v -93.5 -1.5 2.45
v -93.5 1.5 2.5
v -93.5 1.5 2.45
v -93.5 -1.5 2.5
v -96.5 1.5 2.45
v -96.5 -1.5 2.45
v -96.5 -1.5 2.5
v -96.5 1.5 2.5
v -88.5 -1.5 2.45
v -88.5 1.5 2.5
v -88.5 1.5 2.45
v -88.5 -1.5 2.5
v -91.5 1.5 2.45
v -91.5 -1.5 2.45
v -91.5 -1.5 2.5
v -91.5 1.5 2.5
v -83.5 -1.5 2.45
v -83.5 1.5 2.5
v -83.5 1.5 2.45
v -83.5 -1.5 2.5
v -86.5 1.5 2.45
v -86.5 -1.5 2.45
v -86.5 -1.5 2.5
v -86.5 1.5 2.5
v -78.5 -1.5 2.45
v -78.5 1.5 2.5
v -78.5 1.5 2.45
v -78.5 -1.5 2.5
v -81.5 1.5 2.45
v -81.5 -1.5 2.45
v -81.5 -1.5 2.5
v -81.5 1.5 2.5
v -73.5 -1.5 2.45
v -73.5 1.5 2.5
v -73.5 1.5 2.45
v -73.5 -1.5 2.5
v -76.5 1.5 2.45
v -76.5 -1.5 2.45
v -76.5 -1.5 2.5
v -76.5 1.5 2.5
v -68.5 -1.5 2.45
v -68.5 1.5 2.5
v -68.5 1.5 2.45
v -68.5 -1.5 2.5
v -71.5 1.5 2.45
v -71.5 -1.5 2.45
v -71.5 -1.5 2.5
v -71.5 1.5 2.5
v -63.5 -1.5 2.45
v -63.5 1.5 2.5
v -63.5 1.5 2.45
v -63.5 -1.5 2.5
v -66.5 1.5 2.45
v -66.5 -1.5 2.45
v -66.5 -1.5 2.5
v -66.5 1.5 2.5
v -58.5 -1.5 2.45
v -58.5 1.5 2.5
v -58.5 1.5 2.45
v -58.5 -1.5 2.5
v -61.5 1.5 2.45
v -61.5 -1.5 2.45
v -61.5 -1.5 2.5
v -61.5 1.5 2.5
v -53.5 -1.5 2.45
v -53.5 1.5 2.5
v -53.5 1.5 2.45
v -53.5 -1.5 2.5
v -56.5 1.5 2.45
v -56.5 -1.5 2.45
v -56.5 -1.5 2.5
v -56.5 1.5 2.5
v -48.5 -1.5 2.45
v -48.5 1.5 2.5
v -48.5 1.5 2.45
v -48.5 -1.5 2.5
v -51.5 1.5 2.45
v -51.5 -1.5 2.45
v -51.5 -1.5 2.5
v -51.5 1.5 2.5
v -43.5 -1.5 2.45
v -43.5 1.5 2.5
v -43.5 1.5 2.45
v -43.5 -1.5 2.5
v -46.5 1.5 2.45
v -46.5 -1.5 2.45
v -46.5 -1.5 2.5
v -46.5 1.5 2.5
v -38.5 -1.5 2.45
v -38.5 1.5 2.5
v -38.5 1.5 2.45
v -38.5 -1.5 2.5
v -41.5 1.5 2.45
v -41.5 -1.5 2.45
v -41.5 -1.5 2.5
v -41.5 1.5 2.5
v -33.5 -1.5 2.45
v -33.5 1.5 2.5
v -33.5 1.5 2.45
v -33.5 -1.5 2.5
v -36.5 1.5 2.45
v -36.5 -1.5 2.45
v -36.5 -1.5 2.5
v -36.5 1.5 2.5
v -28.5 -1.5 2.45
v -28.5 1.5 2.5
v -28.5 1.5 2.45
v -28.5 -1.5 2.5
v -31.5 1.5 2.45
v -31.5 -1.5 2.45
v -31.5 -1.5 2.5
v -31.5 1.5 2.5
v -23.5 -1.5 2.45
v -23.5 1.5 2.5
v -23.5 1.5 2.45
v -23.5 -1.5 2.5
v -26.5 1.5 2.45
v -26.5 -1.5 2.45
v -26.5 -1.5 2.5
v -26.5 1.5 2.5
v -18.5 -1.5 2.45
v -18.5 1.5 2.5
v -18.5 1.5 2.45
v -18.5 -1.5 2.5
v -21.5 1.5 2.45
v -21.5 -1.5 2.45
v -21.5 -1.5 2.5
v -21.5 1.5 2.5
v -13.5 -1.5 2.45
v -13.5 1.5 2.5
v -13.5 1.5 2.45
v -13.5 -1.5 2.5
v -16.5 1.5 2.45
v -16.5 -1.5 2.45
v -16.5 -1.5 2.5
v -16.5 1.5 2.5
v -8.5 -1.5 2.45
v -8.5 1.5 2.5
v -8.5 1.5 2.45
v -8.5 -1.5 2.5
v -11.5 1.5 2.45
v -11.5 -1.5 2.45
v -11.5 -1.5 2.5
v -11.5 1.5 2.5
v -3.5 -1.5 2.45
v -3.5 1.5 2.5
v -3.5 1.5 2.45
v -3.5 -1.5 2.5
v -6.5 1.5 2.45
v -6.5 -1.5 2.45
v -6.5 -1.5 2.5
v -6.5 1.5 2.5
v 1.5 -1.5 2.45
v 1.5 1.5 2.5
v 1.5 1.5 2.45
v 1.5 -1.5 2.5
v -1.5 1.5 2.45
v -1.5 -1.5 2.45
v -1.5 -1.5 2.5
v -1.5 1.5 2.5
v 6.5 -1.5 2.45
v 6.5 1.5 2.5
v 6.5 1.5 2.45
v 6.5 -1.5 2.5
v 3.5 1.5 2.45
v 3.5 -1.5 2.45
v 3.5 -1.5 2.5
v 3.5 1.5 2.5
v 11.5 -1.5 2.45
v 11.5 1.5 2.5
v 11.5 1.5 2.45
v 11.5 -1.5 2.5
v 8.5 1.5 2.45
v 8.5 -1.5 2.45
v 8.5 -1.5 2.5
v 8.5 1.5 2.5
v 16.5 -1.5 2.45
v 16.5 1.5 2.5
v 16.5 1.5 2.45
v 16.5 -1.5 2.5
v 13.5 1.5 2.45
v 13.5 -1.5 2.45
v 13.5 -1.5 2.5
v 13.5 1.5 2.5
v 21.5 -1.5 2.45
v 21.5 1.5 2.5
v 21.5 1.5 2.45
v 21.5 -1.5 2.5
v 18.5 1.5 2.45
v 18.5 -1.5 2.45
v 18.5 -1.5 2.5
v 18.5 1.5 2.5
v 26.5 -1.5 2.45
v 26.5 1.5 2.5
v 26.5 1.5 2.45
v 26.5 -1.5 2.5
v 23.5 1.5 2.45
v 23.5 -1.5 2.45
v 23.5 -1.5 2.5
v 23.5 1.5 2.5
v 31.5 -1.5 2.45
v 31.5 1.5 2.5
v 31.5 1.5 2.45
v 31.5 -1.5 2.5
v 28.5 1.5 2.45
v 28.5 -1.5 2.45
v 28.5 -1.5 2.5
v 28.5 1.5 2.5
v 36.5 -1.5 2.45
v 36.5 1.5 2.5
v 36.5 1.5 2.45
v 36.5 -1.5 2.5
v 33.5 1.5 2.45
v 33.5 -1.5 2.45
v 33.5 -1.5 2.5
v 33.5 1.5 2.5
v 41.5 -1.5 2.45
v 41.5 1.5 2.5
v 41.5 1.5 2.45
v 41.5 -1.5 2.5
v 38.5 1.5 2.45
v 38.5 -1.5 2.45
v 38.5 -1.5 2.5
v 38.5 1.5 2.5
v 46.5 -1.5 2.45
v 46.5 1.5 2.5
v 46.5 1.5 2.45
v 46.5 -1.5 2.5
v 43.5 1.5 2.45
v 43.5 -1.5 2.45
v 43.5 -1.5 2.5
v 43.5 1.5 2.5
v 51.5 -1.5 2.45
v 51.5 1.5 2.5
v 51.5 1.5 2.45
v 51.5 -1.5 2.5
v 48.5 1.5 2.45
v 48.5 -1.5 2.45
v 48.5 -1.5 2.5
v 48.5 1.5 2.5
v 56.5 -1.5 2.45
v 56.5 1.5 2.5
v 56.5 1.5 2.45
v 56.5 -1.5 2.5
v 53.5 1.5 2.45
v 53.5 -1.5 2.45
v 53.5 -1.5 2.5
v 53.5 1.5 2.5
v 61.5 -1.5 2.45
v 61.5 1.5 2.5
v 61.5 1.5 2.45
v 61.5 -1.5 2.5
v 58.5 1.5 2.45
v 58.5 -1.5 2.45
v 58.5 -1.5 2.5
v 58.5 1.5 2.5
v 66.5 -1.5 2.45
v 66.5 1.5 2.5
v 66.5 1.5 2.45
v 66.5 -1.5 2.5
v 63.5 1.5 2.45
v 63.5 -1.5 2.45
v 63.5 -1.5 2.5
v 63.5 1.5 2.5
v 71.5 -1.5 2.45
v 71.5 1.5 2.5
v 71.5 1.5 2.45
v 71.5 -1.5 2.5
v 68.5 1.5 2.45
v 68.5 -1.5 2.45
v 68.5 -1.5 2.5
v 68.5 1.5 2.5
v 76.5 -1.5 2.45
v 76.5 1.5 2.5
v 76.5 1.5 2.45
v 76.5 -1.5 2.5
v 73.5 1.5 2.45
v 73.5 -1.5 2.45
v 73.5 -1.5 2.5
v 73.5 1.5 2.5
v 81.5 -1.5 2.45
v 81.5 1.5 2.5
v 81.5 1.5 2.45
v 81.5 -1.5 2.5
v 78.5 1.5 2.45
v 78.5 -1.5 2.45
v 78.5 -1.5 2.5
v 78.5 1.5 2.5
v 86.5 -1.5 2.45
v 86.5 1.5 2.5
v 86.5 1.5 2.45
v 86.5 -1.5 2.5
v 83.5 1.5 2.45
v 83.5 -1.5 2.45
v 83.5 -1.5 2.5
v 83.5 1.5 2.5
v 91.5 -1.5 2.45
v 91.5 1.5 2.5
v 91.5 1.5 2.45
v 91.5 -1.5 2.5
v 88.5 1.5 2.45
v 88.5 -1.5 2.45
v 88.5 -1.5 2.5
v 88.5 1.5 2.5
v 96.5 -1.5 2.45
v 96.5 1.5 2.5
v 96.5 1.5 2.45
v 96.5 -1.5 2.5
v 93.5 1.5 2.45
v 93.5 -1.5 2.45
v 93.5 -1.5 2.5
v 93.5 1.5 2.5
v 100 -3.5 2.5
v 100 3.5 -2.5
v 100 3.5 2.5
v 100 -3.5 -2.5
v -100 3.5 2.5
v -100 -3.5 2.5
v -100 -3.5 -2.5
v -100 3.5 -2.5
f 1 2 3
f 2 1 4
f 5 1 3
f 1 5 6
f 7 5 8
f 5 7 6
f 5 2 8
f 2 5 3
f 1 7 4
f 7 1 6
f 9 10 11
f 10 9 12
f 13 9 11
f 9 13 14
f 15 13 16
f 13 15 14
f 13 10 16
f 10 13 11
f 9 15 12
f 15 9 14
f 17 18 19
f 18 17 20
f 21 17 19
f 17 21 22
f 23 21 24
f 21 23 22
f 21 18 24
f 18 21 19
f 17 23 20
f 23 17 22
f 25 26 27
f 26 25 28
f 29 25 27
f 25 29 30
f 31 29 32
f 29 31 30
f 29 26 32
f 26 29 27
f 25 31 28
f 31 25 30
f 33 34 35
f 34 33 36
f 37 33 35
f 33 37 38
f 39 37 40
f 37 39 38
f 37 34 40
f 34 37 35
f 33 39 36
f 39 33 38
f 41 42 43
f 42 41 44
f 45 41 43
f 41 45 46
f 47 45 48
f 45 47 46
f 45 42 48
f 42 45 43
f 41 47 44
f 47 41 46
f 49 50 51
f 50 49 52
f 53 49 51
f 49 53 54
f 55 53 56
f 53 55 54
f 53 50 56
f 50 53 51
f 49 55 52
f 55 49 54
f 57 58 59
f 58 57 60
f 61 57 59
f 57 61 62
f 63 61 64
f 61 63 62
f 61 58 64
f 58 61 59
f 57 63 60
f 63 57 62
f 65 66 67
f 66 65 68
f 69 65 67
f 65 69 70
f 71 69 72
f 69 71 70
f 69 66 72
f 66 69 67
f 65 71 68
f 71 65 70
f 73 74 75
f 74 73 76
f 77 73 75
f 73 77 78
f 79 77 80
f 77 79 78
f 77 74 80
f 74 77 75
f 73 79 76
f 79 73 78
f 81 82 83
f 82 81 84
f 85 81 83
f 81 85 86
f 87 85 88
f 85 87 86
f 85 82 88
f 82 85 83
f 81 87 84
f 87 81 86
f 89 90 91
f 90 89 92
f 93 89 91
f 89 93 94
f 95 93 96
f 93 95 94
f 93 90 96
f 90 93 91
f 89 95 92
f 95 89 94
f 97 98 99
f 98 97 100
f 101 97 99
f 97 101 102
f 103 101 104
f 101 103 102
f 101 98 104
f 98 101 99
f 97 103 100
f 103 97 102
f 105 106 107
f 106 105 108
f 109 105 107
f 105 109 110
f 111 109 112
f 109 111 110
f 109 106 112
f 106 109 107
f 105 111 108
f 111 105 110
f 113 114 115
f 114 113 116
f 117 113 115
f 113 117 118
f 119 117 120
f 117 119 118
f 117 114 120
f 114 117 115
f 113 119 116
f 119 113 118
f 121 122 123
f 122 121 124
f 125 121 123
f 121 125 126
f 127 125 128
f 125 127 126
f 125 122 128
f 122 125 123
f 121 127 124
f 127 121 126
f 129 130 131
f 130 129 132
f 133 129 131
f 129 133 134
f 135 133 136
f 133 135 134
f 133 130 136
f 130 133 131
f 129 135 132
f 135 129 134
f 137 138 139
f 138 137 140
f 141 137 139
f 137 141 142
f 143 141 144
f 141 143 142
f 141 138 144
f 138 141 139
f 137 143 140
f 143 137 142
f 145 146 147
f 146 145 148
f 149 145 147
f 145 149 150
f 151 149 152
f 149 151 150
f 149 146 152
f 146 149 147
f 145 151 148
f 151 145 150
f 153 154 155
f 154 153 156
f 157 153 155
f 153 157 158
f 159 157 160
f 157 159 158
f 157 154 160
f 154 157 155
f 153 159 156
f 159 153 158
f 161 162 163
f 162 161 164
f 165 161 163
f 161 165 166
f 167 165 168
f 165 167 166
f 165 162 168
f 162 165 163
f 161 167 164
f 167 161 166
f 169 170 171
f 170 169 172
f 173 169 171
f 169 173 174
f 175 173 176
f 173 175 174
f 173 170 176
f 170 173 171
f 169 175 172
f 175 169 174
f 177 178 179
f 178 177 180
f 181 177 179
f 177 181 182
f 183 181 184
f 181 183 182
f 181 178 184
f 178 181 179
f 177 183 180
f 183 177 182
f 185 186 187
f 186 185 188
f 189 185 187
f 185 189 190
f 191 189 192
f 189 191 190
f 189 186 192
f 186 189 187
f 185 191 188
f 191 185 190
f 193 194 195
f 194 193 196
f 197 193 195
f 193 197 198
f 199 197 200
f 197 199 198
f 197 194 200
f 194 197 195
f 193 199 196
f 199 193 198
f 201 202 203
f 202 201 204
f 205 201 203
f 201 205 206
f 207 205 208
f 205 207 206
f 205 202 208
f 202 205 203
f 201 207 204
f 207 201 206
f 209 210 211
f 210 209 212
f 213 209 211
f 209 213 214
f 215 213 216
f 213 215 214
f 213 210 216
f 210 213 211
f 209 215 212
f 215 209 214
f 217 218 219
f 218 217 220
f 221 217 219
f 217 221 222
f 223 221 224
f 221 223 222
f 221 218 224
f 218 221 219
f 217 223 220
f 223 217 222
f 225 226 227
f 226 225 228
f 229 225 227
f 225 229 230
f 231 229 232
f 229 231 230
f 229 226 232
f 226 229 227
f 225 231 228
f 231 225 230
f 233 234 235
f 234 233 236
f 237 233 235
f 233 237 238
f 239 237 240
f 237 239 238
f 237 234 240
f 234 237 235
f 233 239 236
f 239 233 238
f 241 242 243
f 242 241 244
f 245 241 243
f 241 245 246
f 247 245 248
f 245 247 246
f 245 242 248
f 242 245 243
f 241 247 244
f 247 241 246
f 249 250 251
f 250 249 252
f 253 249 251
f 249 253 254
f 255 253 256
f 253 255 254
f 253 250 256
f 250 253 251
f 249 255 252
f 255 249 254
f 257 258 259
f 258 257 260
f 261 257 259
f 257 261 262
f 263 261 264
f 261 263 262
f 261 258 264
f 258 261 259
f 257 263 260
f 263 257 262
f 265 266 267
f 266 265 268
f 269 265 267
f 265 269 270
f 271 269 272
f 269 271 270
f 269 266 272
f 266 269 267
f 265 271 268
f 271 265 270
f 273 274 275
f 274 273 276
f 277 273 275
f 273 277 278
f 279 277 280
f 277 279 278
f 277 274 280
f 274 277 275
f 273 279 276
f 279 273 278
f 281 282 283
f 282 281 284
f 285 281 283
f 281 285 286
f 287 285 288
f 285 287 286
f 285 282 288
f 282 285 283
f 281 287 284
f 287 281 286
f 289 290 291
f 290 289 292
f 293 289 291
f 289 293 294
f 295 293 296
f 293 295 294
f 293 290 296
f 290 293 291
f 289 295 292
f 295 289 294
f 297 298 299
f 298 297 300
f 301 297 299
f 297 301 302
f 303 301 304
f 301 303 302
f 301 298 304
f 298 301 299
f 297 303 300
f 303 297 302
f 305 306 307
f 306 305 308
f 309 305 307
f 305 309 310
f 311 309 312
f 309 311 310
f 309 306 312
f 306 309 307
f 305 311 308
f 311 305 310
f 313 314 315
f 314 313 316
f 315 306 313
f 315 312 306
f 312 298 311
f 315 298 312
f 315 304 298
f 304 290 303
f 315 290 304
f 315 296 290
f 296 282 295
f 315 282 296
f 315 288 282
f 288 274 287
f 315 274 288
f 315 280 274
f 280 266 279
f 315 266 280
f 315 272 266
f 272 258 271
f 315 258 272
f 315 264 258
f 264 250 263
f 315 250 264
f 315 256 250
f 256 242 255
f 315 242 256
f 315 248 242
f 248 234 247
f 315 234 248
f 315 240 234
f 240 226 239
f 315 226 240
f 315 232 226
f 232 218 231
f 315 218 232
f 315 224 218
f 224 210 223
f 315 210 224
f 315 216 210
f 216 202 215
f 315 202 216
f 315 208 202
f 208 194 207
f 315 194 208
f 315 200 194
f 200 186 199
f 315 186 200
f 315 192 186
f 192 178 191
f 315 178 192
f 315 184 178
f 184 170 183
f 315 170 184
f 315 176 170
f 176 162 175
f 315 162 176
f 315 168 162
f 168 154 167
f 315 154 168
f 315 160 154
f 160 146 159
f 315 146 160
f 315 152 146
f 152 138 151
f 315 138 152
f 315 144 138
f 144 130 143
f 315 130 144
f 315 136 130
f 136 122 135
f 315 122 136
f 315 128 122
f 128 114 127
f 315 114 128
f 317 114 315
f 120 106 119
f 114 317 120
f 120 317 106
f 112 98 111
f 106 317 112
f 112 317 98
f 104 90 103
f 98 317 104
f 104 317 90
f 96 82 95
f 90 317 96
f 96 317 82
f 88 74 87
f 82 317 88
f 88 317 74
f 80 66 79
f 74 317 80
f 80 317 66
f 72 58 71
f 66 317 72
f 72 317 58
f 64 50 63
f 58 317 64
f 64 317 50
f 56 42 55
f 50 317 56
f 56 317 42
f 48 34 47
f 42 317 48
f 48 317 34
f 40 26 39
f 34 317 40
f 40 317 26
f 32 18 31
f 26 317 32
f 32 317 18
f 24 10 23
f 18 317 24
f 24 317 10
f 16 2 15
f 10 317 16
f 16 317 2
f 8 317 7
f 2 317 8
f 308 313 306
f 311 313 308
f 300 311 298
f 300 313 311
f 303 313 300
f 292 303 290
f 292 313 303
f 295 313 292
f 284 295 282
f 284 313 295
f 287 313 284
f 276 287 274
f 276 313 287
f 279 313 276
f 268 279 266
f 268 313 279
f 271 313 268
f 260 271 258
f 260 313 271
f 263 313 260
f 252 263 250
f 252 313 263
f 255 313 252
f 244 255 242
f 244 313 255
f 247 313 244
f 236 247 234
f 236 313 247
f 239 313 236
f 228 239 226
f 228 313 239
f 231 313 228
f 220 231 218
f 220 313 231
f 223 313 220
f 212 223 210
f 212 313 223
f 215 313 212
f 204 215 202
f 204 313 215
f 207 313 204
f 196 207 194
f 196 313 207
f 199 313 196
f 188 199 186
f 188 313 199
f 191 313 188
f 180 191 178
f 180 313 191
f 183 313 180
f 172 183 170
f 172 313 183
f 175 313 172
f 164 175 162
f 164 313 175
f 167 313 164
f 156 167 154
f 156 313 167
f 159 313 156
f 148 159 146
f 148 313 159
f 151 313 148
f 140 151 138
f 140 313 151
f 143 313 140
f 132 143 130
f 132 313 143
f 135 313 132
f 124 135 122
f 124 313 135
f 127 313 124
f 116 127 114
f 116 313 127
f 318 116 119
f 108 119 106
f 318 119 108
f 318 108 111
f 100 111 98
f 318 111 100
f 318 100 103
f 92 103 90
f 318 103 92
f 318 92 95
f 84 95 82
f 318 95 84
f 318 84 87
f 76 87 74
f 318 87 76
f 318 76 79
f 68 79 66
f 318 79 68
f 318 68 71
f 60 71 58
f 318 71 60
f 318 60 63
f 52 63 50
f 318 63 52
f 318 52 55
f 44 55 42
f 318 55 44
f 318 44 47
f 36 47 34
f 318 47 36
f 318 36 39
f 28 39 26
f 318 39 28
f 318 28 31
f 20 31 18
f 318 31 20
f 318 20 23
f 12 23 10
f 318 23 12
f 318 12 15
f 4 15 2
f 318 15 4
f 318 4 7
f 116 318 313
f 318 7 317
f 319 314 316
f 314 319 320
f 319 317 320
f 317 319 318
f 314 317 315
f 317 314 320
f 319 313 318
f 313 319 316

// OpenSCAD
/* 

comment stuff out here

*/

difference() {
cube([200,7,5], center=true); 

for ( a = [-95 : 5 : 95] ) 
{
translate([a,0,2.5]){
cube([3,3,0.1], center=true);}
}
}
